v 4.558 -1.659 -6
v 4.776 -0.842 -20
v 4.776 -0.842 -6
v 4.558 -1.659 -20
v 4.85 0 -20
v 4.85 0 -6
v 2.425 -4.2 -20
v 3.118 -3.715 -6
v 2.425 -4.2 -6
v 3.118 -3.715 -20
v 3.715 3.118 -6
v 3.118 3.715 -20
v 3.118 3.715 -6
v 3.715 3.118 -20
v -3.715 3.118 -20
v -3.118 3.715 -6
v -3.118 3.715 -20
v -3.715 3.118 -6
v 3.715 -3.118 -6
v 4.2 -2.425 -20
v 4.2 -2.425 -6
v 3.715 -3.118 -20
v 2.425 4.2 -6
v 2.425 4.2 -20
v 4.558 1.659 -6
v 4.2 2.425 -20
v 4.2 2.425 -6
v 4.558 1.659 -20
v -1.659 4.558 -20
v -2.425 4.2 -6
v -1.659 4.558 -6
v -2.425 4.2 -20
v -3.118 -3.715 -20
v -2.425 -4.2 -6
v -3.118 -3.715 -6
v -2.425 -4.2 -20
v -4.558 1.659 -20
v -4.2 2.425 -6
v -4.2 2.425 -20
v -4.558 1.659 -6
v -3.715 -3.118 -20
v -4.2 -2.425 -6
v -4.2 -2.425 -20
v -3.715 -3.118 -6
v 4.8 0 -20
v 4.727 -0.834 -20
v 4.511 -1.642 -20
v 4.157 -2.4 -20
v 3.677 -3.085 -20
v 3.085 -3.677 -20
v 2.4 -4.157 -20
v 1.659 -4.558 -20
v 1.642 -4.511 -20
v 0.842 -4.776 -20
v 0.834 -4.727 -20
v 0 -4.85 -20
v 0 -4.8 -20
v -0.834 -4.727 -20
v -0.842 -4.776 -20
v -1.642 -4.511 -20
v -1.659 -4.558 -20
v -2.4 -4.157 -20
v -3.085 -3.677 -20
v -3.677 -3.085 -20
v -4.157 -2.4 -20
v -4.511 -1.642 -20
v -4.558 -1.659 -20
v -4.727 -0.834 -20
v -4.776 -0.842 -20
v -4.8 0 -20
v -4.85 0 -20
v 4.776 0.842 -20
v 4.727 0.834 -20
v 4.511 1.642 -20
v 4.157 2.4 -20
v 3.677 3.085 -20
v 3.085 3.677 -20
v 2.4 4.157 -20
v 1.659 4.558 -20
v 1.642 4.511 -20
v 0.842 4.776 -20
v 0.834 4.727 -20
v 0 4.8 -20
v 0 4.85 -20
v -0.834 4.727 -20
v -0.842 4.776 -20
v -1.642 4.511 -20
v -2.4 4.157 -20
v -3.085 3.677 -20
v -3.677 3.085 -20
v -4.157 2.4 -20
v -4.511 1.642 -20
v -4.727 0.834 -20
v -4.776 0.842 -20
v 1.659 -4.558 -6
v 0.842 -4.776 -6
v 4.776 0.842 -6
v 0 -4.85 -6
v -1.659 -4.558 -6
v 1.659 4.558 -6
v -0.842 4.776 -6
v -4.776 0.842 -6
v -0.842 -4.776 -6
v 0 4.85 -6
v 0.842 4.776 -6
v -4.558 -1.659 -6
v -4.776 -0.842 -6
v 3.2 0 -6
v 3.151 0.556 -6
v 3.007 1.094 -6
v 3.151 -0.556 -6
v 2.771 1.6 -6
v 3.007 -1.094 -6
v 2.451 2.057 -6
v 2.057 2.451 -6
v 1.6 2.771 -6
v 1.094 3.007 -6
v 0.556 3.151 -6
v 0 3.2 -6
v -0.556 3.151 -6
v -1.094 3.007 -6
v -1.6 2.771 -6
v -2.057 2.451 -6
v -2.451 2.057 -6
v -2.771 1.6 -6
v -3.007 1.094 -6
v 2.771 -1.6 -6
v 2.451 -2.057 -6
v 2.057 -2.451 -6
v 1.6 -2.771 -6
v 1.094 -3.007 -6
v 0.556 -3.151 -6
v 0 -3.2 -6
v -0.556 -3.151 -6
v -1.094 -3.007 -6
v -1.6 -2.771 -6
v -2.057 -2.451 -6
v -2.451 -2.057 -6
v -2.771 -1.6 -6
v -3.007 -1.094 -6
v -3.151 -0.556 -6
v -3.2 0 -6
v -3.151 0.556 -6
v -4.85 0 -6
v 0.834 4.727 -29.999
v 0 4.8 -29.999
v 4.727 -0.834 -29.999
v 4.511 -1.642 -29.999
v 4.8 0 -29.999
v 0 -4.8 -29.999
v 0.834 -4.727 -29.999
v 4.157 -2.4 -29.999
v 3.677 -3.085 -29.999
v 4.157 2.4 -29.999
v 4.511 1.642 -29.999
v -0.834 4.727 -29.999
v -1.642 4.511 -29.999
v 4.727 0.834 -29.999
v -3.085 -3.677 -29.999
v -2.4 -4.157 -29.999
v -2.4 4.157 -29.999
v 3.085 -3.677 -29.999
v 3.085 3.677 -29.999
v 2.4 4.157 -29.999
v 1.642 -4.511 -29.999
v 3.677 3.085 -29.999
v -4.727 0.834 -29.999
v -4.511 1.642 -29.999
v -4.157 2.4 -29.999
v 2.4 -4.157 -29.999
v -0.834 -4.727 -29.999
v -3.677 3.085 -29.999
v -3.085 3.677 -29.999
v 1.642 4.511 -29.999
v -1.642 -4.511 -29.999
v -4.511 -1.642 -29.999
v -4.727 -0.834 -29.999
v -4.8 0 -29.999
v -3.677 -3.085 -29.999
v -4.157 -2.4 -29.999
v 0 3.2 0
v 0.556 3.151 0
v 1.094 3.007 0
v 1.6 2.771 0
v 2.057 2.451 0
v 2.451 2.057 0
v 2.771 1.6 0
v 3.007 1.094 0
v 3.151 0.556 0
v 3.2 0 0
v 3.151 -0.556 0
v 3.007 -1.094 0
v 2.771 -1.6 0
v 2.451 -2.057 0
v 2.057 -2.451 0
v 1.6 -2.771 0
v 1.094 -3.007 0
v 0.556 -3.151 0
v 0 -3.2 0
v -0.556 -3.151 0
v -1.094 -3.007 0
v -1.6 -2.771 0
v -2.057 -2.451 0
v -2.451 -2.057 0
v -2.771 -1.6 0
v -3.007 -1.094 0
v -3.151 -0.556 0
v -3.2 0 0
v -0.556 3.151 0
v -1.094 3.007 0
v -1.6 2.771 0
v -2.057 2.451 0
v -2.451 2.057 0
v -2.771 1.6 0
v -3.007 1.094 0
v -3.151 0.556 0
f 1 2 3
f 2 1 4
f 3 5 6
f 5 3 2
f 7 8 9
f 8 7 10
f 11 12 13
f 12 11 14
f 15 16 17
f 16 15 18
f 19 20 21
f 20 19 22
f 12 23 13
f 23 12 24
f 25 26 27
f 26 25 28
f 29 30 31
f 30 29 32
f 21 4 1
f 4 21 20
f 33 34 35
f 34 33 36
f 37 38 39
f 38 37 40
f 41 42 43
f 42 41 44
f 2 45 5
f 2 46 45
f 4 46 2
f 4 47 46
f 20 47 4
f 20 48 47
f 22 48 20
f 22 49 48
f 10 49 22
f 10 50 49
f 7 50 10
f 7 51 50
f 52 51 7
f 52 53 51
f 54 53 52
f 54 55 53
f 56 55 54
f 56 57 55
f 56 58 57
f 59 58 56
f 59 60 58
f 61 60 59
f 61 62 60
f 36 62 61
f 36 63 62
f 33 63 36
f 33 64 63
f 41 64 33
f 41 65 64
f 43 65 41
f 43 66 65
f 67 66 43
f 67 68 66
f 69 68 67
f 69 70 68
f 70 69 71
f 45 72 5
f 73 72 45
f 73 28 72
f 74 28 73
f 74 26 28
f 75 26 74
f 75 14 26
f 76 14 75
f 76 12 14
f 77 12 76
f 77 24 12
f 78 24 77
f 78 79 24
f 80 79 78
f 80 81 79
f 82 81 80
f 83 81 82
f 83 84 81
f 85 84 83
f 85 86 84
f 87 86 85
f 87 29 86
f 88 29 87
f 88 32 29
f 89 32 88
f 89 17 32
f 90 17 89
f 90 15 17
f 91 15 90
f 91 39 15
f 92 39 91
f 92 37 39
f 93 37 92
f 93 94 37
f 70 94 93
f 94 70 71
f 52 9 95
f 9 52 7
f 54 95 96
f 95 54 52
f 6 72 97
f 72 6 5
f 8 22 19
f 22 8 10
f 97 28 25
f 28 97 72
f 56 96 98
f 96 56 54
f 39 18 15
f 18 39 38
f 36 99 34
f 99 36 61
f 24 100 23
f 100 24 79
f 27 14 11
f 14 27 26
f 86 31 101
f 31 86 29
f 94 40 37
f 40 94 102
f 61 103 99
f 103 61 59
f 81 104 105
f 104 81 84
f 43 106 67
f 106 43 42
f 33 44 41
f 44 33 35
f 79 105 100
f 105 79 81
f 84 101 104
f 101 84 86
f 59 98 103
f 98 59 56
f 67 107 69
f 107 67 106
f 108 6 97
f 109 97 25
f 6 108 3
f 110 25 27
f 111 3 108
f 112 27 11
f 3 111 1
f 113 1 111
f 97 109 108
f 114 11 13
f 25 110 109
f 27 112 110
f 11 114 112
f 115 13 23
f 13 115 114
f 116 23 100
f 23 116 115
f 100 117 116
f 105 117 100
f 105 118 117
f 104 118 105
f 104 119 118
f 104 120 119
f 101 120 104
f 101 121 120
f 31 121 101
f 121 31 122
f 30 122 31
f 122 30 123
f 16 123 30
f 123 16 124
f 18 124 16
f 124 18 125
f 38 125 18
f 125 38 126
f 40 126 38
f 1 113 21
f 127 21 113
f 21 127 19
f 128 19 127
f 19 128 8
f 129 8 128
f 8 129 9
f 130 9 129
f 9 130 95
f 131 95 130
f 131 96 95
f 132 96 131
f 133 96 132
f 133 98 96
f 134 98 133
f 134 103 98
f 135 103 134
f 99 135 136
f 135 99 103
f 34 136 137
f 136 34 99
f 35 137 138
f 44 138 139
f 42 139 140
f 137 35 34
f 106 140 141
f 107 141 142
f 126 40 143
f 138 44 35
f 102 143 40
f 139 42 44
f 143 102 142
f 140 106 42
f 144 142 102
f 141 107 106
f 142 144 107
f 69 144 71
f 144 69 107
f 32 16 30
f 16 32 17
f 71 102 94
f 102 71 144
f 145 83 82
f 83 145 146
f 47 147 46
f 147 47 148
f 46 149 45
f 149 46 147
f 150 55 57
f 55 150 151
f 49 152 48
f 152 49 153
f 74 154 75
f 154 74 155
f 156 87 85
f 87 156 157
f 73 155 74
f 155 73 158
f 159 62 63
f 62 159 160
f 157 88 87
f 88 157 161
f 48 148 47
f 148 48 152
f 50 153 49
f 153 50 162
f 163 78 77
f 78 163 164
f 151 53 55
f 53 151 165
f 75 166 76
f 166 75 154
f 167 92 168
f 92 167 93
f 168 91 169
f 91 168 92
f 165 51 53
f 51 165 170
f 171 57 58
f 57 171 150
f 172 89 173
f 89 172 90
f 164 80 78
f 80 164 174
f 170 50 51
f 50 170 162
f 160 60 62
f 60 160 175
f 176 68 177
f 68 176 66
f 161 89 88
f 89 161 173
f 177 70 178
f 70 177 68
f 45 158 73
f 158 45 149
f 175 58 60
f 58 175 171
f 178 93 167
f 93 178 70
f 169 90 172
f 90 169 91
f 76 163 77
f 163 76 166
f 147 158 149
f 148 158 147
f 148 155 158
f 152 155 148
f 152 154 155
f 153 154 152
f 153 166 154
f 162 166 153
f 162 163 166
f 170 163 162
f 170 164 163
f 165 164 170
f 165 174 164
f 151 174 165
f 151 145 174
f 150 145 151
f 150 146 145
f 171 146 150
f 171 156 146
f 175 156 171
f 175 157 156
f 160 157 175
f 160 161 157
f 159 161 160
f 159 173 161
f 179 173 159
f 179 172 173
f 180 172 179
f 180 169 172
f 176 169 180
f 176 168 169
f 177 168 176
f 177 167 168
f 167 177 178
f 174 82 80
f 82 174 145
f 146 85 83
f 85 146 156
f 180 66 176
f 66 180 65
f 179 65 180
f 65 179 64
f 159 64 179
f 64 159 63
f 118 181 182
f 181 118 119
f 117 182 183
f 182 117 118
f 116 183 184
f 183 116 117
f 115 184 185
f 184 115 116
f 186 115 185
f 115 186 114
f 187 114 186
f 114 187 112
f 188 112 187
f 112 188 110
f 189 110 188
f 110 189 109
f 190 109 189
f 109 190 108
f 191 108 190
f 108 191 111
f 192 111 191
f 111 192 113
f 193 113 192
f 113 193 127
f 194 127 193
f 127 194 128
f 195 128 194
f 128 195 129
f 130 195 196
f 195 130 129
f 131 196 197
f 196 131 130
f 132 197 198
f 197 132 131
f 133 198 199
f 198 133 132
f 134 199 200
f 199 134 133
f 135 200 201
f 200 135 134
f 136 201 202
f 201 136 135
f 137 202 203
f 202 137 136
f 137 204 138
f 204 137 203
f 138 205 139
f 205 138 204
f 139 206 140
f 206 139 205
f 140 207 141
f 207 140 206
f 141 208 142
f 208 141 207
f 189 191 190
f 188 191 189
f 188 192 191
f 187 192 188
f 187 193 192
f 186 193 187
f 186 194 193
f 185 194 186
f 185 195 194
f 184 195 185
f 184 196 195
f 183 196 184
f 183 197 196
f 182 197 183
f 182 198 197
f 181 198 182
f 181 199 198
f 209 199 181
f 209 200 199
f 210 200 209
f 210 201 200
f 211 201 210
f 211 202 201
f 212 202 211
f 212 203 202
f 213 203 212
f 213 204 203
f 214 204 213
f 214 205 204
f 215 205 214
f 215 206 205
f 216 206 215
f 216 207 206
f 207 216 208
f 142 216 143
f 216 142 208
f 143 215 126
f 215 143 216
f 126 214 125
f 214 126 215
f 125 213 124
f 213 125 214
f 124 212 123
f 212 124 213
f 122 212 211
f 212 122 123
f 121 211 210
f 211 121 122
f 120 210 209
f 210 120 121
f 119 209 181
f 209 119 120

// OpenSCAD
// Start: lazy_union
default_5_default_5();
// End: lazy_union

// Modules.

// 'PartMaterial undef-default - default 5.0'
module default_5_default_5() {
  // 'None : _combine_solids_and_holes'
  union() {
    // 'default : _combine_solids_and_holes'
    union() {
      // 'screw_cage'
      %multmatrix(m=[[1.0, 0.0, 0.0, 0.0], [-0.0, -1.0, -0.0, -0.0], [-0.0, -0.0, -1.0, -0.0], [0.0, 0.0, 0.0, 1.0]]) {
        // 'screw_cage'
        color(c=[0.0, 1.0, 0.35, 0.4]) {
          // 'screw_cage : _combine_solids_and_holes'
          union() {
            // 'screw_cage'
            cylinder(h=20.0, r1=3.35, r2=3.35, center=false, $fn=36);
          }
        }
      }
      // 'thru_shaft'
      multmatrix(m=[[1.0, 0.0, 0.0, 0.0], [0.0, -1.0, 0.0, 0.0], [0.0, 0.0, -1.0, -6.0], [0.0, 0.0, 0.0, 1.0]]) {
        // 'thru_shaft : _combine_solids_and_holes'
        union() {
          // 'thru_shaft'
          cylinder(h=14.0, r1=4.85, r2=4.85, center=false, $fn=36);
        }
      }
      // 'access_hole'
      multmatrix(m=[[1.0, 0.0, 0.0, 0.0], [0.0, -1.0, 0.0, 0.0], [0.0, 0.0, -1.0, -19.999], [0.0, 0.0, 0.0, 1.0]]) {
        // 'access_hole : _combine_solids_and_holes'
        union() {
          // 'access_hole'
          cylinder(h=10.0, r1=4.800000000000001, r2=4.800000000000001, center=false, $fn=36);
        }
      }
      // 'screw_hole'
      multmatrix(m=[[0.0, -1.0, 0.0, 0.0], [-1.0, 0.0, 0.0, 0.0], [0.0, 0.0, -1.0, 0.0], [0.0, 0.0, 0.0, 1.0]]) {
        // 'screw_hole : _combine_solids_and_holes'
        union() {
          // 'screw_hole'
          polyhedron(points=[[0.0, 0.0, 0.0], [-3.2, 0.0, 0.0], [-3.2, 0.0, 6.0], [-3.35, 0.0, 6.0], [-3.35, 0.0, 17.759999999999998], [-4.800000000000001, 0.0, 17.759999999999998], [-4.800000000000001, 0.0, 20.0], [0.0, 0.0, 20.0], [0.0, 0.0, 0.0], [-3.1513848096390658, -0.5556741685341771, 0.0], [-3.1513848096390658, -0.5556741685341771, 6.0], [-3.299105972590897, -0.5817213951842166, 6.0], [-3.299105972590897, -0.5817213951842166, 17.759999999999998], [-4.727077214458599, -0.8335112528012657, 17.759999999999998], [-4.727077214458599, -0.8335112528012657, 20.0], [0.0, 0.0, 20.0], [0.0, 0.0, 0.0], [-3.0070163865149073, -1.09446445864214, 0.0], [-3.0070163865149073, -1.09446445864214, 6.0], [-3.1479702796327933, -1.1457674801409903, 6.0], [-3.1479702796327933, -1.1457674801409903, 17.759999999999998], [-4.510524579772361, -1.64169668796321, 17.759999999999998], [-4.510524579772361, -1.64169668796321, 20.0], [0.0, 0.0, 20.0], [0.0, 0.0, 0.0], [-2.771281292110204, -1.5999999999999999, 0.0], [-2.771281292110204, -1.5999999999999999, 6.0], [-2.9011851026778697, -1.6749999999999998, 6.0], [-2.9011851026778697, -1.6749999999999998, 17.759999999999998], [-4.156921938165306, -2.4, 17.759999999999998], [-4.156921938165306, -2.4, 20.0], [0.0, 0.0, 20.0], [0.0, 0.0, 0.0], [-2.45134221798073, -2.0569203509969256, 0.0], [-2.45134221798073, -2.0569203509969256, 6.0], [-2.5662488844485765, -2.1533384924499064, 6.0], [-2.5662488844485765, -2.1533384924499064, 17.759999999999998], [-3.677013326971095, -3.085380526495389, 17.759999999999998], [-3.677013326971095, -3.085380526495389, 20.0], [0.0, 0.0, 20.0], [0.0, 0.0, 0.0], [-2.056920350996926, -2.45134221798073, 0.0], [-2.056920350996926, -2.45134221798073, 6.0], [-2.153338492449907, -2.5662488844485765, 6.0], [-2.153338492449907, -2.5662488844485765, 17.759999999999998], [-3.0853805264953893, -3.677013326971095, 17.759999999999998], [-3.0853805264953893, -3.677013326971095, 20.0], [0.0, 0.0, 20.0], [0.0, 0.0, 0.0], [-1.6000000000000005, -2.7712812921102037, 0.0], [-1.6000000000000005, -2.7712812921102037, 6.0], [-1.6750000000000005, -2.901185102677869, 6.0], [-1.6750000000000005, -2.901185102677869, 17.759999999999998], [-2.400000000000001, -4.156921938165306, 17.759999999999998], [-2.400000000000001, -4.156921938165306, 20.0], [0.0, 0.0, 20.0], [0.0, 0.0, 0.0], [-1.0944644586421404, -3.007016386514907, 0.0], [-1.0944644586421404, -3.007016386514907, 6.0], [-1.1457674801409905, -3.147970279632793, 6.0], [-1.1457674801409905, -3.147970279632793, 17.759999999999998], [-1.6416966879632107, -4.510524579772361, 17.759999999999998], [-1.6416966879632107, -4.510524579772361, 20.0], [0.0, 0.0, 20.0], [0.0, 0.0, 0.0], [-0.5556741685341774, -3.1513848096390658, 0.0], [-0.5556741685341774, -3.1513848096390658, 6.0], [-0.581721395184217, -3.299105972590897, 6.0], [-0.581721395184217, -3.299105972590897, 17.759999999999998], [-0.8335112528012661, -4.727077214458599, 17.759999999999998], [-0.8335112528012661, -4.727077214458599, 20.0], [0.0, 0.0, 20.0], [0.0, 0.0, 0.0], [0.0, -3.2, 0.0], [0.0, -3.2, 6.0], [0.0, -3.35, 6.0], [0.0, -3.35, 17.759999999999998], [0.0, -4.800000000000001, 17.759999999999998], [0.0, -4.800000000000001, 20.0], [0.0, 0.0, 20.0], [0.0, 0.0, 0.0], [0.555674168534177, -3.1513848096390658, 0.0], [0.555674168534177, -3.1513848096390658, 6.0], [0.5817213951842165, -3.299105972590897, 6.0], [0.5817213951842165, -3.299105972590897, 17.759999999999998], [0.8335112528012656, -4.727077214458599, 17.759999999999998], [0.8335112528012656, -4.727077214458599, 20.0], [0.0, 0.0, 20.0], [0.0, 0.0, 0.0], [1.09446445864214, -3.0070163865149073, 0.0], [1.09446445864214, -3.0070163865149073, 6.0], [1.1457674801409903, -3.1479702796327933, 6.0], [1.1457674801409903, -3.1479702796327933, 17.759999999999998], [1.64169668796321, -4.510524579772361, 17.759999999999998], [1.64169668796321, -4.510524579772361, 20.0], [0.0, 0.0, 20.0], [0.0, 0.0, 0.0], [1.5999999999999994, -2.771281292110204, 0.0], [1.5999999999999994, -2.771281292110204, 6.0], [1.6749999999999994, -2.9011851026778697, 6.0], [1.6749999999999994, -2.9011851026778697, 17.759999999999998], [2.3999999999999995, -4.156921938165306, 17.759999999999998], [2.3999999999999995, -4.156921938165306, 20.0], [0.0, 0.0, 20.0], [0.0, 0.0, 0.0], [2.056920350996926, -2.45134221798073, 0.0], [2.056920350996926, -2.45134221798073, 6.0], [2.153338492449907, -2.5662488844485765, 6.0], [2.153338492449907, -2.5662488844485765, 17.759999999999998], [3.0853805264953893, -3.677013326971095, 17.759999999999998], [3.0853805264953893, -3.677013326971095, 20.0], [0.0, 0.0, 20.0], [0.0, 0.0, 0.0], [2.4513422179807294, -2.0569203509969265, 0.0], [2.4513422179807294, -2.0569203509969265, 6.0], [2.566248884448576, -2.1533384924499073, 6.0], [2.566248884448576, -2.1533384924499073, 17.759999999999998], [3.6770133269710943, -3.0853805264953897, 17.759999999999998], [3.6770133269710943, -3.0853805264953897, 20.0], [0.0, 0.0, 20.0], [0.0, 0.0, 0.0], [2.771281292110204, -1.5999999999999999, 0.0], [2.771281292110204, -1.5999999999999999, 6.0], [2.9011851026778697, -1.6749999999999998, 6.0], [2.9011851026778697, -1.6749999999999998, 17.759999999999998], [4.156921938165306, -2.4, 17.759999999999998], [4.156921938165306, -2.4, 20.0], [0.0, 0.0, 20.0], [0.0, 0.0, 0.0], [3.007016386514907, -1.0944644586421404, 0.0], [3.007016386514907, -1.0944644586421404, 6.0], [3.147970279632793, -1.1457674801409907, 6.0], [3.147970279632793, -1.1457674801409907, 17.759999999999998], [4.510524579772361, -1.6416966879632109, 17.759999999999998], [4.510524579772361, -1.6416966879632109, 20.0], [0.0, 0.0, 20.0], [0.0, 0.0, 0.0], [3.1513848096390658, -0.5556741685341783, 0.0], [3.1513848096390658, -0.5556741685341783, 6.0], [3.299105972590897, -0.5817213951842178, 6.0], [3.299105972590897, -0.5817213951842178, 17.759999999999998], [4.727077214458599, -0.8335112528012675, 17.759999999999998], [4.727077214458599, -0.8335112528012675, 20.0], [0.0, 0.0, 20.0], [0.0, 0.0, 0.0], [3.2, 0.0, 0.0], [3.2, 0.0, 6.0], [3.35, 0.0, 6.0], [3.35, 0.0, 17.759999999999998], [4.800000000000001, 0.0, 17.759999999999998], [4.800000000000001, 0.0, 20.0], [0.0, 0.0, 20.0], [0.0, 0.0, 0.0], [3.151384809639066, 0.5556741685341761, 0.0], [3.151384809639066, 0.5556741685341761, 6.0], [3.299105972590897, 0.5817213951842156, 6.0], [3.299105972590897, 0.5817213951842156, 17.759999999999998], [4.7270772144586, 0.8335112528012643, 17.759999999999998], [4.7270772144586, 0.8335112528012643, 20.0], [0.0, 0.0, 20.0], [0.0, 0.0, 0.0], [3.0070163865149073, 1.0944644586421397, 0.0], [3.0070163865149073, 1.0944644586421397, 6.0], [3.1479702796327933, 1.14576748014099, 6.0], [3.1479702796327933, 1.14576748014099, 17.759999999999998], [4.510524579772361, 1.6416966879632098, 17.759999999999998], [4.510524579772361, 1.6416966879632098, 20.0], [0.0, 0.0, 20.0], [0.0, 0.0, 0.0], [2.7712812921102046, 1.5999999999999992, 0.0], [2.7712812921102046, 1.5999999999999992, 6.0], [2.90118510267787, 1.6749999999999992, 6.0], [2.90118510267787, 1.6749999999999992, 17.759999999999998], [4.156921938165307, 2.399999999999999, 17.759999999999998], [4.156921938165307, 2.399999999999999, 20.0], [0.0, 0.0, 20.0], [0.0, 0.0, 0.0], [2.45134221798073, 2.0569203509969256, 0.0], [2.45134221798073, 2.0569203509969256, 6.0], [2.5662488844485765, 2.1533384924499064, 6.0], [2.5662488844485765, 2.1533384924499064, 17.759999999999998], [3.677013326971095, 3.085380526495389, 17.759999999999998], [3.677013326971095, 3.085380526495389, 20.0], [0.0, 0.0, 20.0], [0.0, 0.0, 0.0], [2.0569203509969265, 2.4513422179807294, 0.0], [2.0569203509969265, 2.4513422179807294, 6.0], [2.1533384924499073, 2.566248884448576, 6.0], [2.1533384924499073, 2.566248884448576, 17.759999999999998], [3.0853805264953897, 3.6770133269710943, 17.759999999999998], [3.0853805264953897, 3.6770133269710943, 20.0], [0.0, 0.0, 20.0], [0.0, 0.0, 0.0], [1.6000000000000014, 2.7712812921102032, 0.0], [1.6000000000000014, 2.7712812921102032, 6.0], [1.6750000000000016, 2.901185102677869, 6.0], [1.6750000000000016, 2.901185102677869, 17.759999999999998], [2.4000000000000026, 4.156921938165305, 17.759999999999998], [2.4000000000000026, 4.156921938165305, 20.0], [0.0, 0.0, 20.0], [0.0, 0.0, 0.0], [1.0944644586421421, 3.0070163865149064, 0.0], [1.0944644586421421, 3.0070163865149064, 6.0], [1.1457674801409925, 3.1479702796327924, 6.0], [1.1457674801409925, 3.1479702796327924, 17.759999999999998], [1.6416966879632133, 4.51052457977236, 17.759999999999998], [1.6416966879632133, 4.51052457977236, 20.0], [0.0, 0.0, 20.0], [0.0, 0.0, 0.0], [0.5556741685341771, 3.1513848096390658, 0.0], [0.5556741685341771, 3.1513848096390658, 6.0], [0.5817213951842166, 3.299105972590897, 6.0], [0.5817213951842166, 3.299105972590897, 17.759999999999998], [0.8335112528012657, 4.727077214458599, 17.759999999999998], [0.8335112528012657, 4.727077214458599, 20.0], [0.0, 0.0, 20.0], [0.0, 0.0, 0.0], [0.0, 3.2, 0.0], [0.0, 3.2, 6.0], [0.0, 3.35, 6.0], [0.0, 3.35, 17.759999999999998], [0.0, 4.800000000000001, 17.759999999999998], [0.0, 4.800000000000001, 20.0], [0.0, 0.0, 20.0], [0.0, 0.0, 0.0], [-0.555674168534176, 3.151384809639066, 0.0], [-0.555674168534176, 3.151384809639066, 6.0], [-0.5817213951842154, 3.299105972590897, 6.0], [-0.5817213951842154, 3.299105972590897, 17.759999999999998], [-0.833511252801264, 4.7270772144586, 17.759999999999998], [-0.833511252801264, 4.7270772144586, 20.0], [0.0, 0.0, 20.0], [0.0, 0.0, 0.0], [-1.0944644586421381, 3.0070163865149073, 0.0], [-1.0944644586421381, 3.0070163865149073, 6.0], [-1.1457674801409883, 3.1479702796327937, 6.0], [-1.1457674801409883, 3.1479702796327937, 17.759999999999998], [-1.6416966879632073, 4.510524579772362, 17.759999999999998], [-1.6416966879632073, 4.510524579772362, 20.0], [0.0, 0.0, 20.0], [0.0, 0.0, 0.0], [-1.6000000000000005, 2.7712812921102037, 0.0], [-1.6000000000000005, 2.7712812921102037, 6.0], [-1.6750000000000005, 2.901185102677869, 6.0], [-1.6750000000000005, 2.901185102677869, 17.759999999999998], [-2.400000000000001, 4.156921938165306, 17.759999999999998], [-2.400000000000001, 4.156921938165306, 20.0], [0.0, 0.0, 20.0], [0.0, 0.0, 0.0], [-2.0569203509969256, 2.4513422179807303, 0.0], [-2.0569203509969256, 2.4513422179807303, 6.0], [-2.1533384924499064, 2.566248884448577, 6.0], [-2.1533384924499064, 2.566248884448577, 17.759999999999998], [-3.085380526495389, 3.6770133269710956, 17.759999999999998], [-3.085380526495389, 3.6770133269710956, 20.0], [0.0, 0.0, 20.0], [0.0, 0.0, 0.0], [-2.451342217980729, 2.056920350996927, 0.0], [-2.451342217980729, 2.056920350996927, 6.0], [-2.5662488844485756, 2.1533384924499077, 6.0], [-2.5662488844485756, 2.1533384924499077, 17.759999999999998], [-3.677013326971094, 3.0853805264953906, 17.759999999999998], [-3.677013326971094, 3.0853805264953906, 20.0], [0.0, 0.0, 20.0], [0.0, 0.0, 0.0], [-2.771281292110203, 1.6000000000000014, 0.0], [-2.771281292110203, 1.6000000000000014, 6.0], [-2.9011851026778688, 1.6750000000000016, 6.0], [-2.9011851026778688, 1.6750000000000016, 17.759999999999998], [-4.156921938165305, 2.4000000000000026, 17.759999999999998], [-4.156921938165305, 2.4000000000000026, 20.0], [0.0, 0.0, 20.0], [0.0, 0.0, 0.0], [-3.007016386514906, 1.0944644586421421, 0.0], [-3.007016386514906, 1.0944644586421421, 6.0], [-3.1479702796327924, 1.1457674801409927, 6.0], [-3.1479702796327924, 1.1457674801409927, 17.759999999999998], [-4.510524579772359, 1.6416966879632136, 17.759999999999998], [-4.510524579772359, 1.6416966879632136, 20.0], [0.0, 0.0, 20.0], [0.0, 0.0, 0.0], [-3.1513848096390658, 0.5556741685341773, 0.0], [-3.1513848096390658, 0.5556741685341773, 6.0], [-3.299105972590897, 0.5817213951842168, 6.0], [-3.299105972590897, 0.5817213951842168, 17.759999999999998], [-4.727077214458599, 0.833511252801266, 17.759999999999998], [-4.727077214458599, 0.833511252801266, 20.0], [0.0, 0.0, 20.0], [0.0, 0.0, 0.0], [-3.2, 0.0, 0.0], [-3.2, 0.0, 6.0], [-3.35, 0.0, 6.0], [-3.35, 0.0, 17.759999999999998], [-4.800000000000001, 0.0, 17.759999999999998], [-4.800000000000001, 0.0, 20.0], [0.0, 0.0, 20.0]], faces=[[0, 8, 9, 1], [1, 9, 10, 2], [2, 10, 11, 3], [3, 11, 12, 4], [4, 12, 13, 5], [5, 13, 14, 6], [6, 14, 15, 7], [7, 15, 8, 0], [8, 16, 17, 9], [9, 17, 18, 10], [10, 18, 19, 11], [11, 19, 20, 12], [12, 20, 21, 13], [13, 21, 22, 14], [14, 22, 23, 15], [15, 23, 16, 8], [16, 24, 25, 17], [17, 25, 26, 18], [18, 26, 27, 19], [19, 27, 28, 20], [20, 28, 29, 21], [21, 29, 30, 22], [22, 30, 31, 23], [23, 31, 24, 16], [24, 32, 33, 25], [25, 33, 34, 26], [26, 34, 35, 27], [27, 35, 36, 28], [28, 36, 37, 29], [29, 37, 38, 30], [30, 38, 39, 31], [31, 39, 32, 24], [32, 40, 41, 33], [33, 41, 42, 34], [34, 42, 43, 35], [35, 43, 44, 36], [36, 44, 45, 37], [37, 45, 46, 38], [38, 46, 47, 39], [39, 47, 40, 32], [40, 48, 49, 41], [41, 49, 50, 42], [42, 50, 51, 43], [43, 51, 52, 44], [44, 52, 53, 45], [45, 53, 54, 46], [46, 54, 55, 47], [47, 55, 48, 40], [48, 56, 57, 49], [49, 57, 58, 50], [50, 58, 59, 51], [51, 59, 60, 52], [52, 60, 61, 53], [53, 61, 62, 54], [54, 62, 63, 55], [55, 63, 56, 48], [56, 64, 65, 57], [57, 65, 66, 58], [58, 66, 67, 59], [59, 67, 68, 60], [60, 68, 69, 61], [61, 69, 70, 62], [62, 70, 71, 63], [63, 71, 64, 56], [64, 72, 73, 65], [65, 73, 74, 66], [66, 74, 75, 67], [67, 75, 76, 68], [68, 76, 77, 69], [69, 77, 78, 70], [70, 78, 79, 71], [71, 79, 72, 64], [72, 80, 81, 73], [73, 81, 82, 74], [74, 82, 83, 75], [75, 83, 84, 76], [76, 84, 85, 77], [77, 85, 86, 78], [78, 86, 87, 79], [79, 87, 80, 72], [80, 88, 89, 81], [81, 89, 90, 82], [82, 90, 91, 83], [83, 91, 92, 84], [84, 92, 93, 85], [85, 93, 94, 86], [86, 94, 95, 87], [87, 95, 88, 80], [88, 96, 97, 89], [89, 97, 98, 90], [90, 98, 99, 91], [91, 99, 100, 92], [92, 100, 101, 93], [93, 101, 102, 94], [94, 102, 103, 95], [95, 103, 96, 88], [96, 104, 105, 97], [97, 105, 106, 98], [98, 106, 107, 99], [99, 107, 108, 100], [100, 108, 109, 101], [101, 109, 110, 102], [102, 110, 111, 103], [103, 111, 104, 96], [104, 112, 113, 105], [105, 113, 114, 106], [106, 114, 115, 107], [107, 115, 116, 108], [108, 116, 117, 109], [109, 117, 118, 110], [110, 118, 119, 111], [111, 119, 112, 104], [112, 120, 121, 113], [113, 121, 122, 114], [114, 122, 123, 115], [115, 123, 124, 116], [116, 124, 125, 117], [117, 125, 126, 118], [118, 126, 127, 119], [119, 127, 120, 112], [120, 128, 129, 121], [121, 129, 130, 122], [122, 130, 131, 123], [123, 131, 132, 124], [124, 132, 133, 125], [125, 133, 134, 126], [126, 134, 135, 127], [127, 135, 128, 120], [128, 136, 137, 129], [129, 137, 138, 130], [130, 138, 139, 131], [131, 139, 140, 132], [132, 140, 141, 133], [133, 141, 142, 134], [134, 142, 143, 135], [135, 143, 136, 128], [136, 144, 145, 137], [137, 145, 146, 138], [138, 146, 147, 139], [139, 147, 148, 140], [140, 148, 149, 141], [141, 149, 150, 142], [142, 150, 151, 143], [143, 151, 144, 136], [144, 152, 153, 145], [145, 153, 154, 146], [146, 154, 155, 147], [147, 155, 156, 148], [148, 156, 157, 149], [149, 157, 158, 150], [150, 158, 159, 151], [151, 159, 152, 144], [152, 160, 161, 153], [153, 161, 162, 154], [154, 162, 163, 155], [155, 163, 164, 156], [156, 164, 165, 157], [157, 165, 166, 158], [158, 166, 167, 159], [159, 167, 160, 152], [160, 168, 169, 161], [161, 169, 170, 162], [162, 170, 171, 163], [163, 171, 172, 164], [164, 172, 173, 165], [165, 173, 174, 166], [166, 174, 175, 167], [167, 175, 168, 160], [168, 176, 177, 169], [169, 177, 178, 170], [170, 178, 179, 171], [171, 179, 180, 172], [172, 180, 181, 173], [173, 181, 182, 174], [174, 182, 183, 175], [175, 183, 176, 168], [176, 184, 185, 177], [177, 185, 186, 178], [178, 186, 187, 179], [179, 187, 188, 180], [180, 188, 189, 181], [181, 189, 190, 182], [182, 190, 191, 183], [183, 191, 184, 176], [184, 192, 193, 185], [185, 193, 194, 186], [186, 194, 195, 187], [187, 195, 196, 188], [188, 196, 197, 189], [189, 197, 198, 190], [190, 198, 199, 191], [191, 199, 192, 184], [192, 200, 201, 193], [193, 201, 202, 194], [194, 202, 203, 195], [195, 203, 204, 196], [196, 204, 205, 197], [197, 205, 206, 198], [198, 206, 207, 199], [199, 207, 200, 192], [200, 208, 209, 201], [201, 209, 210, 202], [202, 210, 211, 203], [203, 211, 212, 204], [204, 212, 213, 205], [205, 213, 214, 206], [206, 214, 215, 207], [207, 215, 208, 200], [208, 216, 217, 209], [209, 217, 218, 210], [210, 218, 219, 211], [211, 219, 220, 212], [212, 220, 221, 213], [213, 221, 222, 214], [214, 222, 223, 215], [215, 223, 216, 208], [216, 224, 225, 217], [217, 225, 226, 218], [218, 226, 227, 219], [219, 227, 228, 220], [220, 228, 229, 221], [221, 229, 230, 222], [222, 230, 231, 223], [223, 231, 224, 216], [224, 232, 233, 225], [225, 233, 234, 226], [226, 234, 235, 227], [227, 235, 236, 228], [228, 236, 237, 229], [229, 237, 238, 230], [230, 238, 239, 231], [231, 239, 232, 224], [232, 240, 241, 233], [233, 241, 242, 234], [234, 242, 243, 235], [235, 243, 244, 236], [236, 244, 245, 237], [237, 245, 246, 238], [238, 246, 247, 239], [239, 247, 240, 232], [240, 248, 249, 241], [241, 249, 250, 242], [242, 250, 251, 243], [243, 251, 252, 244], [244, 252, 253, 245], [245, 253, 254, 246], [246, 254, 255, 247], [247, 255, 248, 240], [248, 256, 257, 249], [249, 257, 258, 250], [250, 258, 259, 251], [251, 259, 260, 252], [252, 260, 261, 253], [253, 261, 262, 254], [254, 262, 263, 255], [255, 263, 256, 248], [256, 264, 265, 257], [257, 265, 266, 258], [258, 266, 267, 259], [259, 267, 268, 260], [260, 268, 269, 261], [261, 269, 270, 262], [262, 270, 271, 263], [263, 271, 264, 256], [264, 272, 273, 265], [265, 273, 274, 266], [266, 274, 275, 267], [267, 275, 276, 268], [268, 276, 277, 269], [269, 277, 278, 270], [270, 278, 279, 271], [271, 279, 272, 264], [272, 280, 281, 273], [273, 281, 282, 274], [274, 282, 283, 275], [275, 283, 284, 276], [276, 284, 285, 277], [277, 285, 286, 278], [278, 286, 287, 279], [279, 287, 280, 272], [280, 288, 289, 281], [281, 289, 290, 282], [282, 290, 291, 283], [283, 291, 292, 284], [284, 292, 293, 285], [285, 293, 294, 286], [286, 294, 295, 287], [287, 295, 288, 280], [288, 0, 1, 289], [289, 1, 2, 290], [290, 2, 3, 291], [291, 3, 4, 292], [292, 4, 5, 293], [293, 5, 6, 294], [294, 6, 7, 295], [295, 7, 0, 288]], convexity=10);
        }
      }
    }
  }
} // end module default_5_default_5
